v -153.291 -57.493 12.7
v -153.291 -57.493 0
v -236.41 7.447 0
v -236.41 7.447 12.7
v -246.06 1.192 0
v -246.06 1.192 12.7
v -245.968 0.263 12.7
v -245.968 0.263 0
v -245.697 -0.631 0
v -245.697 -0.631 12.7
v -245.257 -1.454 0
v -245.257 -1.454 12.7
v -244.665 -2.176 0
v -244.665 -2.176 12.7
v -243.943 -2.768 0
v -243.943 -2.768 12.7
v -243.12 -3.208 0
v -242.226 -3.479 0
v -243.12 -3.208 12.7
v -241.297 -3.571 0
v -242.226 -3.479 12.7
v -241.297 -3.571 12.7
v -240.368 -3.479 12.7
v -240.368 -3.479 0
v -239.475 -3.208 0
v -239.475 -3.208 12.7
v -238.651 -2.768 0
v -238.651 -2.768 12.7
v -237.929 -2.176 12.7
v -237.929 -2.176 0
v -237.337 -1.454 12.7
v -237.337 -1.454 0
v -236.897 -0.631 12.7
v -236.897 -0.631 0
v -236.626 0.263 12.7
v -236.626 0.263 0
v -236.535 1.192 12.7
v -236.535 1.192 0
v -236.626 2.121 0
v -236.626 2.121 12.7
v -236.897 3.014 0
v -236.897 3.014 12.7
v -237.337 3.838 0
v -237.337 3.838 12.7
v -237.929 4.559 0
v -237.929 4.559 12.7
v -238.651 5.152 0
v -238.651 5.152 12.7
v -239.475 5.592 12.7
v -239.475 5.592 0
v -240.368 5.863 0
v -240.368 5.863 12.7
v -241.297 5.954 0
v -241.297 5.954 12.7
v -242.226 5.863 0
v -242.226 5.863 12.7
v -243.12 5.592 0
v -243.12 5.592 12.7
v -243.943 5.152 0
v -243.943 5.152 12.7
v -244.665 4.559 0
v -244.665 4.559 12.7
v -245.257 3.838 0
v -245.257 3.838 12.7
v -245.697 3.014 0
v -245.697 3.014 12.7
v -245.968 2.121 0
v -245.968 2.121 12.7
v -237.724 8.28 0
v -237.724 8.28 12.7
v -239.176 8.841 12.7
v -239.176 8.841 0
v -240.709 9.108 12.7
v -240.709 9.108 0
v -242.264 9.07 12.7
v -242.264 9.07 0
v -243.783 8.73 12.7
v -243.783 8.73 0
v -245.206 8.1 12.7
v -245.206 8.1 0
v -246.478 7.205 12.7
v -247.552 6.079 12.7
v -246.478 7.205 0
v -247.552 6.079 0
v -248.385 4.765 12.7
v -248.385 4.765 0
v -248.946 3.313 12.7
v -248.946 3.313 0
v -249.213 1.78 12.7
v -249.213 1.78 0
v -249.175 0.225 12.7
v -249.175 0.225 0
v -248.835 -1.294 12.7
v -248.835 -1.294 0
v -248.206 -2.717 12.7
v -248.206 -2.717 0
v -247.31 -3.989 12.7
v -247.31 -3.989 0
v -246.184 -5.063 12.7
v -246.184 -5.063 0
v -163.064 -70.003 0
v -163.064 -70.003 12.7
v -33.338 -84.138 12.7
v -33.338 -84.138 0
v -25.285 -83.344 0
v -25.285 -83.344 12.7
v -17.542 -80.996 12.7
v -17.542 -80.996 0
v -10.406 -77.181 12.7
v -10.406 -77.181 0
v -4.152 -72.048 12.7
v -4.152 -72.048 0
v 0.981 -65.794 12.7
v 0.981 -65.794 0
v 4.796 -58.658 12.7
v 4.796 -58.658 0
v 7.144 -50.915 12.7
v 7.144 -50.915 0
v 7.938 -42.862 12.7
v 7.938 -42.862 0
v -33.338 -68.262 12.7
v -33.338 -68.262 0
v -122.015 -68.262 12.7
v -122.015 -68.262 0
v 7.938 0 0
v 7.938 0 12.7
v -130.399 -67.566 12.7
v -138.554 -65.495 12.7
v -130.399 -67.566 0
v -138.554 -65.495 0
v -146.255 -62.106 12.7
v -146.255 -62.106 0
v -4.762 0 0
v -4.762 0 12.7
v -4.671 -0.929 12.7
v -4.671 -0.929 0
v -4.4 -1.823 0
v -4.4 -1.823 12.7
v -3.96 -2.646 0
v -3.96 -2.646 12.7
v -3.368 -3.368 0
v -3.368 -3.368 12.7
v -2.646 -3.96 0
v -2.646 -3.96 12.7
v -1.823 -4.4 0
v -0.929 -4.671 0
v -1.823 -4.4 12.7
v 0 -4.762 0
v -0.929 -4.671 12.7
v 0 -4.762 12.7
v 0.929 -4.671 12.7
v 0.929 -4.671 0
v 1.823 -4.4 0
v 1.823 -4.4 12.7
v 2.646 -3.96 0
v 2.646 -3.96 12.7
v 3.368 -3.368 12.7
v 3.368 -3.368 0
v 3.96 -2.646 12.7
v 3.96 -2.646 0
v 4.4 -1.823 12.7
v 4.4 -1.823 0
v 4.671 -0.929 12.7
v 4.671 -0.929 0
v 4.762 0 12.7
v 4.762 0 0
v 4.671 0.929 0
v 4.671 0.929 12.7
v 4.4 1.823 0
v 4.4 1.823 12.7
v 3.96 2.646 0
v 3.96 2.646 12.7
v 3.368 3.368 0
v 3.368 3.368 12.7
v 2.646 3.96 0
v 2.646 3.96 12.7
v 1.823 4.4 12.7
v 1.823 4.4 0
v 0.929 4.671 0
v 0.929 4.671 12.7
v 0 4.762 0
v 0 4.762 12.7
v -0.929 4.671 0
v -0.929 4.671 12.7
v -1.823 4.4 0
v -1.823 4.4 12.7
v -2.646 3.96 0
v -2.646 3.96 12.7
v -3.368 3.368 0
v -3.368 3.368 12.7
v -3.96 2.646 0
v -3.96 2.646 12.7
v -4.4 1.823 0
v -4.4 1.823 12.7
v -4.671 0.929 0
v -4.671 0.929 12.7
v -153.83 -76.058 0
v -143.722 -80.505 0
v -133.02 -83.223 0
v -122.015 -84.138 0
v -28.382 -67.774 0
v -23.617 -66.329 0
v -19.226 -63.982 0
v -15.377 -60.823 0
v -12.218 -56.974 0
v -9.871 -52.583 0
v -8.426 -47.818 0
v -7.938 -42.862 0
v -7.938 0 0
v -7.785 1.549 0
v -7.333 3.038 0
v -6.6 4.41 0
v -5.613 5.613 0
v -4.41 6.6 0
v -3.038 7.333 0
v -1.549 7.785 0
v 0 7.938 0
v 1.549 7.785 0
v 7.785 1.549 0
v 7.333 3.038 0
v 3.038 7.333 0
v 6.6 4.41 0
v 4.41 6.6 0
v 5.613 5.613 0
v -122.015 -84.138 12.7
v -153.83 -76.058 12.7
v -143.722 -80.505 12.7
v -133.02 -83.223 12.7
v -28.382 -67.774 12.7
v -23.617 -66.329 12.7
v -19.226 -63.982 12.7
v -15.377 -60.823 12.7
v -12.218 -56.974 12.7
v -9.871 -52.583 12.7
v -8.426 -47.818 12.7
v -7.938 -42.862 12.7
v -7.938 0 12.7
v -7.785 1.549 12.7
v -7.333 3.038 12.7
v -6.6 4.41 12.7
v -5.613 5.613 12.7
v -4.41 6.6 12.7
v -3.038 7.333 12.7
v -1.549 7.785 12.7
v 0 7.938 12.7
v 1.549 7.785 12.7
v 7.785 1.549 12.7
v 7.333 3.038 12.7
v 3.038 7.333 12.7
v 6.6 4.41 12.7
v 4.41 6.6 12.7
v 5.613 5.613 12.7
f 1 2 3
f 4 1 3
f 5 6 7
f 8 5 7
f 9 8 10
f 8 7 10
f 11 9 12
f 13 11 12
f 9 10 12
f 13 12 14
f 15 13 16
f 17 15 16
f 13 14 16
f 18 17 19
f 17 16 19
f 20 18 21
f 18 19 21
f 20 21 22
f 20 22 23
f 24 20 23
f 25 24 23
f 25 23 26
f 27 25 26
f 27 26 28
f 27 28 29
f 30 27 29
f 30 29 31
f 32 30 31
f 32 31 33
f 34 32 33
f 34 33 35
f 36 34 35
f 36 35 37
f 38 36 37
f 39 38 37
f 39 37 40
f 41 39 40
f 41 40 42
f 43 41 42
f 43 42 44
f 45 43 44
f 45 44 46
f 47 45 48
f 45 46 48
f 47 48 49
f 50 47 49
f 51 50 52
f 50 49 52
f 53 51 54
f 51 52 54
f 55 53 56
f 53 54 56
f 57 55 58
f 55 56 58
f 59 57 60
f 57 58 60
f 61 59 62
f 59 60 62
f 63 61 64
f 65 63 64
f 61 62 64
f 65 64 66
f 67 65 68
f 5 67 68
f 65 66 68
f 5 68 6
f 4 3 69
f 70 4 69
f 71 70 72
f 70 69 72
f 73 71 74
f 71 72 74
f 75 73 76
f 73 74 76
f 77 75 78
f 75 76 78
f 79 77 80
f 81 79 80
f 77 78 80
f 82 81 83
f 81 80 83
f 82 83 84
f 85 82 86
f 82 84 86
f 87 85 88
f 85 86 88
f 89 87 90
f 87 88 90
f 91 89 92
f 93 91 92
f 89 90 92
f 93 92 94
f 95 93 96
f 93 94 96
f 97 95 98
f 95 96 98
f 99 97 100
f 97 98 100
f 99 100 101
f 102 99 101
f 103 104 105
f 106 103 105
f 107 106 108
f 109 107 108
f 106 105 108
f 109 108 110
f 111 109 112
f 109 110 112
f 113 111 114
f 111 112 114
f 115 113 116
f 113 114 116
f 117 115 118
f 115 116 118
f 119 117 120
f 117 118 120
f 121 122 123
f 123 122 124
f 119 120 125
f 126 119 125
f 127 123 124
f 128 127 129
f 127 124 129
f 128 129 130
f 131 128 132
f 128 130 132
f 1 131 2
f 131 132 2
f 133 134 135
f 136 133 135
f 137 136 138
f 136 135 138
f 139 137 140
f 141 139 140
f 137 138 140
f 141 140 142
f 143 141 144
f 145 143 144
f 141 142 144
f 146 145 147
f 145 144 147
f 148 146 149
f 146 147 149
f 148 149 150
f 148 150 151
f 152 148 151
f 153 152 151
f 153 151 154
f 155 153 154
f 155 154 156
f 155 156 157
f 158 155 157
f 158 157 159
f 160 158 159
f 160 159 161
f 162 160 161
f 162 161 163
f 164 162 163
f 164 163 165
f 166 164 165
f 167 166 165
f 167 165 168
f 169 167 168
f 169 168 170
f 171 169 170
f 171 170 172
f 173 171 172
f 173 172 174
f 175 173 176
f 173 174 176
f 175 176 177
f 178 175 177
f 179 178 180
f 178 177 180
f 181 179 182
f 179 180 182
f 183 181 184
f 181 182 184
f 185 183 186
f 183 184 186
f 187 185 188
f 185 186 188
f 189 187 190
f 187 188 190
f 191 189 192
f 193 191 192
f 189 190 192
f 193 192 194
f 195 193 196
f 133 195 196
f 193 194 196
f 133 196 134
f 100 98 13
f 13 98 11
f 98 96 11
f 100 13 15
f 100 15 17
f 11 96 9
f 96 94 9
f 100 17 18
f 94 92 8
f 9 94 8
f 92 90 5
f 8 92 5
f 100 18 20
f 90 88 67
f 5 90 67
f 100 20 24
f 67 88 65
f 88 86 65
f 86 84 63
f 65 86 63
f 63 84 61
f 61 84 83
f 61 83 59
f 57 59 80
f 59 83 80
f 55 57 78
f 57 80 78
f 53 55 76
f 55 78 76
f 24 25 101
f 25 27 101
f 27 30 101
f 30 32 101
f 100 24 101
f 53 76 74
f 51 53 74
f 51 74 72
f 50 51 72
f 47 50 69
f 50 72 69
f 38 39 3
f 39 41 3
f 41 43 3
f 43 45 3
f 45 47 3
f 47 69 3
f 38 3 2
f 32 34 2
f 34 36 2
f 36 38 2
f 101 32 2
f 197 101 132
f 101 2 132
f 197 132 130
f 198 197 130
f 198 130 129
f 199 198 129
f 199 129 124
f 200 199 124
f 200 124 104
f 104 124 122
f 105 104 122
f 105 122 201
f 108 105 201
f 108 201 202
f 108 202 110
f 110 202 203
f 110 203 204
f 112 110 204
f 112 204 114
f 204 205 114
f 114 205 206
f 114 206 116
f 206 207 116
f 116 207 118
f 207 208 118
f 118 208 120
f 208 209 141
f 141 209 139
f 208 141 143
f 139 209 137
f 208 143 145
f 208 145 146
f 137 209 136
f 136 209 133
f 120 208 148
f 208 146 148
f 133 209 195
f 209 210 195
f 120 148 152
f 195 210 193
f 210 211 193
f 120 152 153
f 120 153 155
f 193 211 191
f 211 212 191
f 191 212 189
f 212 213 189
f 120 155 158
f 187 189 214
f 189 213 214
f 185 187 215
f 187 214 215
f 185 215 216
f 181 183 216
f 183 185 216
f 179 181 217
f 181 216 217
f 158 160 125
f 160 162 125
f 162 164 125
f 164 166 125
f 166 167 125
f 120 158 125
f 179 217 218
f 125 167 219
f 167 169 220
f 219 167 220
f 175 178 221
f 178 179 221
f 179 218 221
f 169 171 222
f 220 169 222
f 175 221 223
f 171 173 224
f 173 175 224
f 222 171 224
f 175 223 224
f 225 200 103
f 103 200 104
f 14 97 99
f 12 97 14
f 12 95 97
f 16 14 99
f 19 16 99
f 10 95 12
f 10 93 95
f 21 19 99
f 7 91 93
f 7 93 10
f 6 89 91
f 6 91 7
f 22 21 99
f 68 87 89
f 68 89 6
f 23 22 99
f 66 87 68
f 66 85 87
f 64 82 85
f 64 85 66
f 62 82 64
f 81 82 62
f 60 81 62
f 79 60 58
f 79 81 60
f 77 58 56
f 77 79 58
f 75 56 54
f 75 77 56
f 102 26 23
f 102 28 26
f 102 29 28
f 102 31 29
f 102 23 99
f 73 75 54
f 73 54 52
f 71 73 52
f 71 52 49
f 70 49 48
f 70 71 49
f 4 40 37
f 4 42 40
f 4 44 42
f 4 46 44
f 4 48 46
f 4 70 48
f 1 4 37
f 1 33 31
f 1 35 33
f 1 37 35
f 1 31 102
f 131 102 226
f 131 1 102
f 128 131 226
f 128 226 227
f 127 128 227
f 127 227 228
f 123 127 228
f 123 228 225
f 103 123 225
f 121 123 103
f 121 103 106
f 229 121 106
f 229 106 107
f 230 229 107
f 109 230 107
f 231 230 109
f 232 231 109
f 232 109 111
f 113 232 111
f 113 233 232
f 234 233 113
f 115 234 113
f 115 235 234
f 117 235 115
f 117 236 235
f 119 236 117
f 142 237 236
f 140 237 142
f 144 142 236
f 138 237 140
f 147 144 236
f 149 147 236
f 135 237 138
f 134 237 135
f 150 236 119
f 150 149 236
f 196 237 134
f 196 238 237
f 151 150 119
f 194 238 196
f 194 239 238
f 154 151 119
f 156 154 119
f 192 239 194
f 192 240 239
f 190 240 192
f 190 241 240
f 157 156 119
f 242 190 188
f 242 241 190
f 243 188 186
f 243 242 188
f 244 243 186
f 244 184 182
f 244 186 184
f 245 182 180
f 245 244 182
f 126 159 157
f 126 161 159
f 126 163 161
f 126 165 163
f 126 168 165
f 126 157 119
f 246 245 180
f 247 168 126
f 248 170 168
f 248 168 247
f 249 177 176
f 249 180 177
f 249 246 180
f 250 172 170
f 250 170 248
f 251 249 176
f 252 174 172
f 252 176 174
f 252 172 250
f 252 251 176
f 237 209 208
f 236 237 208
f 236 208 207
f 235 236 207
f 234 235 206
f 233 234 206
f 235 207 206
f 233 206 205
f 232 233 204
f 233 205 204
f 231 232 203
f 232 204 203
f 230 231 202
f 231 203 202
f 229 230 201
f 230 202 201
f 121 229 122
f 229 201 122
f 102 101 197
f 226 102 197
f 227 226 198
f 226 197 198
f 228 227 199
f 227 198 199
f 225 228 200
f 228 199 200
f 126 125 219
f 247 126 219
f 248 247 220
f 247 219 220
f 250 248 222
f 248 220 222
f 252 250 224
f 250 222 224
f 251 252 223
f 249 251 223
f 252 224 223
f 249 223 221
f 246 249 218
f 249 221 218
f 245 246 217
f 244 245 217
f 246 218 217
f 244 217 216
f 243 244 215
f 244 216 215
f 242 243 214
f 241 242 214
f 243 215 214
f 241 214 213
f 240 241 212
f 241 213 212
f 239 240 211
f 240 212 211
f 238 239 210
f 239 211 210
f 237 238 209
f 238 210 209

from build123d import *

# Parameters (mm, degrees)
F2_DEPTH = 12.7
F3_D     = 9.525


with BuildPart() as f2:
    # F1 (on Top) → F2 (new body)
    with BuildSketch(Plane.XY):
        with BuildLine():
            ThreePointArc((-122.0150568144, -68.2625), (-138.5539190608, -65.4948436404), (-153.2906597609, -57.4934462832))
            Line((-153.2906597609, -57.4934462832), (-236.4102435549, 7.4466898162))
            ThreePointArc((-236.4102435549, 7.4466898162), (-234.1628787728, 4.6714254371), (-233.3595565153, 1.1918544595))
            ThreePointArc((-233.3595565153, 1.1918544595), (-237.8174855377, -5.942323283), (-246.1838694757, -5.0629808973))
            Line((-246.1838694757, -5.0629808973), (-163.0642856817, -70.0031169967))
            ThreePointArc((-163.0642856817, -70.0031169967), (-143.7223135128, -80.5049510281), (-122.0150568144, -84.1375))
            Line((-122.0150568144, -84.1375), (-33.3375, -84.1375))
            ThreePointArc((-33.3375, -84.1375), (-4.1516676065, -72.0483323935), (7.9375, -42.8625))
            Line((7.9375, -42.8625), (7.9375, 0))
            ThreePointArc((7.9375, 0), (0, -7.9375), (-7.9375, 0))
            Line((-7.9375, 0), (-7.9375, -42.8625))
            ThreePointArc((-7.9375, -42.8625), (-15.3769877579, -60.8230122421), (-33.3375, -68.2625))
            Line((-33.3375, -68.2625), (-122.0150568144, -68.2625))
        make_face()
        with BuildLine():
            ThreePointArc((-233.3595565153, 1.1918544595), (-234.1628787728, 4.6714254371), (-236.4102435549, 7.4466898162))
            ThreePointArc((-236.4102435549, 7.4466898162), (-247.5518918721, 6.0786674199), (-246.1838694757, -5.0629808973))
            ThreePointArc((-246.1838694757, -5.0629808973), (-237.8174855377, -5.942323283), (-233.3595565153, 1.1918544595))
        make_face()
        with BuildLine():
            ThreePointArc((7.9375, 0), (0, 7.9375), (-7.9375, 0))
            ThreePointArc((-7.9375, 0), (0, -7.9375), (7.9375, 0))
        make_face()
    extrude(amount=F2_DEPTH)

    # F3 (through all)
    with Locations(Plane(origin=(0, 0, 0), x_dir=(1, 0, 0), z_dir=(0, 0, -1))):
        with Locations((-241.2970565153, -1.1918544595), (0, 0)):
            Hole(F3_D / 2)


solid = f2.part
